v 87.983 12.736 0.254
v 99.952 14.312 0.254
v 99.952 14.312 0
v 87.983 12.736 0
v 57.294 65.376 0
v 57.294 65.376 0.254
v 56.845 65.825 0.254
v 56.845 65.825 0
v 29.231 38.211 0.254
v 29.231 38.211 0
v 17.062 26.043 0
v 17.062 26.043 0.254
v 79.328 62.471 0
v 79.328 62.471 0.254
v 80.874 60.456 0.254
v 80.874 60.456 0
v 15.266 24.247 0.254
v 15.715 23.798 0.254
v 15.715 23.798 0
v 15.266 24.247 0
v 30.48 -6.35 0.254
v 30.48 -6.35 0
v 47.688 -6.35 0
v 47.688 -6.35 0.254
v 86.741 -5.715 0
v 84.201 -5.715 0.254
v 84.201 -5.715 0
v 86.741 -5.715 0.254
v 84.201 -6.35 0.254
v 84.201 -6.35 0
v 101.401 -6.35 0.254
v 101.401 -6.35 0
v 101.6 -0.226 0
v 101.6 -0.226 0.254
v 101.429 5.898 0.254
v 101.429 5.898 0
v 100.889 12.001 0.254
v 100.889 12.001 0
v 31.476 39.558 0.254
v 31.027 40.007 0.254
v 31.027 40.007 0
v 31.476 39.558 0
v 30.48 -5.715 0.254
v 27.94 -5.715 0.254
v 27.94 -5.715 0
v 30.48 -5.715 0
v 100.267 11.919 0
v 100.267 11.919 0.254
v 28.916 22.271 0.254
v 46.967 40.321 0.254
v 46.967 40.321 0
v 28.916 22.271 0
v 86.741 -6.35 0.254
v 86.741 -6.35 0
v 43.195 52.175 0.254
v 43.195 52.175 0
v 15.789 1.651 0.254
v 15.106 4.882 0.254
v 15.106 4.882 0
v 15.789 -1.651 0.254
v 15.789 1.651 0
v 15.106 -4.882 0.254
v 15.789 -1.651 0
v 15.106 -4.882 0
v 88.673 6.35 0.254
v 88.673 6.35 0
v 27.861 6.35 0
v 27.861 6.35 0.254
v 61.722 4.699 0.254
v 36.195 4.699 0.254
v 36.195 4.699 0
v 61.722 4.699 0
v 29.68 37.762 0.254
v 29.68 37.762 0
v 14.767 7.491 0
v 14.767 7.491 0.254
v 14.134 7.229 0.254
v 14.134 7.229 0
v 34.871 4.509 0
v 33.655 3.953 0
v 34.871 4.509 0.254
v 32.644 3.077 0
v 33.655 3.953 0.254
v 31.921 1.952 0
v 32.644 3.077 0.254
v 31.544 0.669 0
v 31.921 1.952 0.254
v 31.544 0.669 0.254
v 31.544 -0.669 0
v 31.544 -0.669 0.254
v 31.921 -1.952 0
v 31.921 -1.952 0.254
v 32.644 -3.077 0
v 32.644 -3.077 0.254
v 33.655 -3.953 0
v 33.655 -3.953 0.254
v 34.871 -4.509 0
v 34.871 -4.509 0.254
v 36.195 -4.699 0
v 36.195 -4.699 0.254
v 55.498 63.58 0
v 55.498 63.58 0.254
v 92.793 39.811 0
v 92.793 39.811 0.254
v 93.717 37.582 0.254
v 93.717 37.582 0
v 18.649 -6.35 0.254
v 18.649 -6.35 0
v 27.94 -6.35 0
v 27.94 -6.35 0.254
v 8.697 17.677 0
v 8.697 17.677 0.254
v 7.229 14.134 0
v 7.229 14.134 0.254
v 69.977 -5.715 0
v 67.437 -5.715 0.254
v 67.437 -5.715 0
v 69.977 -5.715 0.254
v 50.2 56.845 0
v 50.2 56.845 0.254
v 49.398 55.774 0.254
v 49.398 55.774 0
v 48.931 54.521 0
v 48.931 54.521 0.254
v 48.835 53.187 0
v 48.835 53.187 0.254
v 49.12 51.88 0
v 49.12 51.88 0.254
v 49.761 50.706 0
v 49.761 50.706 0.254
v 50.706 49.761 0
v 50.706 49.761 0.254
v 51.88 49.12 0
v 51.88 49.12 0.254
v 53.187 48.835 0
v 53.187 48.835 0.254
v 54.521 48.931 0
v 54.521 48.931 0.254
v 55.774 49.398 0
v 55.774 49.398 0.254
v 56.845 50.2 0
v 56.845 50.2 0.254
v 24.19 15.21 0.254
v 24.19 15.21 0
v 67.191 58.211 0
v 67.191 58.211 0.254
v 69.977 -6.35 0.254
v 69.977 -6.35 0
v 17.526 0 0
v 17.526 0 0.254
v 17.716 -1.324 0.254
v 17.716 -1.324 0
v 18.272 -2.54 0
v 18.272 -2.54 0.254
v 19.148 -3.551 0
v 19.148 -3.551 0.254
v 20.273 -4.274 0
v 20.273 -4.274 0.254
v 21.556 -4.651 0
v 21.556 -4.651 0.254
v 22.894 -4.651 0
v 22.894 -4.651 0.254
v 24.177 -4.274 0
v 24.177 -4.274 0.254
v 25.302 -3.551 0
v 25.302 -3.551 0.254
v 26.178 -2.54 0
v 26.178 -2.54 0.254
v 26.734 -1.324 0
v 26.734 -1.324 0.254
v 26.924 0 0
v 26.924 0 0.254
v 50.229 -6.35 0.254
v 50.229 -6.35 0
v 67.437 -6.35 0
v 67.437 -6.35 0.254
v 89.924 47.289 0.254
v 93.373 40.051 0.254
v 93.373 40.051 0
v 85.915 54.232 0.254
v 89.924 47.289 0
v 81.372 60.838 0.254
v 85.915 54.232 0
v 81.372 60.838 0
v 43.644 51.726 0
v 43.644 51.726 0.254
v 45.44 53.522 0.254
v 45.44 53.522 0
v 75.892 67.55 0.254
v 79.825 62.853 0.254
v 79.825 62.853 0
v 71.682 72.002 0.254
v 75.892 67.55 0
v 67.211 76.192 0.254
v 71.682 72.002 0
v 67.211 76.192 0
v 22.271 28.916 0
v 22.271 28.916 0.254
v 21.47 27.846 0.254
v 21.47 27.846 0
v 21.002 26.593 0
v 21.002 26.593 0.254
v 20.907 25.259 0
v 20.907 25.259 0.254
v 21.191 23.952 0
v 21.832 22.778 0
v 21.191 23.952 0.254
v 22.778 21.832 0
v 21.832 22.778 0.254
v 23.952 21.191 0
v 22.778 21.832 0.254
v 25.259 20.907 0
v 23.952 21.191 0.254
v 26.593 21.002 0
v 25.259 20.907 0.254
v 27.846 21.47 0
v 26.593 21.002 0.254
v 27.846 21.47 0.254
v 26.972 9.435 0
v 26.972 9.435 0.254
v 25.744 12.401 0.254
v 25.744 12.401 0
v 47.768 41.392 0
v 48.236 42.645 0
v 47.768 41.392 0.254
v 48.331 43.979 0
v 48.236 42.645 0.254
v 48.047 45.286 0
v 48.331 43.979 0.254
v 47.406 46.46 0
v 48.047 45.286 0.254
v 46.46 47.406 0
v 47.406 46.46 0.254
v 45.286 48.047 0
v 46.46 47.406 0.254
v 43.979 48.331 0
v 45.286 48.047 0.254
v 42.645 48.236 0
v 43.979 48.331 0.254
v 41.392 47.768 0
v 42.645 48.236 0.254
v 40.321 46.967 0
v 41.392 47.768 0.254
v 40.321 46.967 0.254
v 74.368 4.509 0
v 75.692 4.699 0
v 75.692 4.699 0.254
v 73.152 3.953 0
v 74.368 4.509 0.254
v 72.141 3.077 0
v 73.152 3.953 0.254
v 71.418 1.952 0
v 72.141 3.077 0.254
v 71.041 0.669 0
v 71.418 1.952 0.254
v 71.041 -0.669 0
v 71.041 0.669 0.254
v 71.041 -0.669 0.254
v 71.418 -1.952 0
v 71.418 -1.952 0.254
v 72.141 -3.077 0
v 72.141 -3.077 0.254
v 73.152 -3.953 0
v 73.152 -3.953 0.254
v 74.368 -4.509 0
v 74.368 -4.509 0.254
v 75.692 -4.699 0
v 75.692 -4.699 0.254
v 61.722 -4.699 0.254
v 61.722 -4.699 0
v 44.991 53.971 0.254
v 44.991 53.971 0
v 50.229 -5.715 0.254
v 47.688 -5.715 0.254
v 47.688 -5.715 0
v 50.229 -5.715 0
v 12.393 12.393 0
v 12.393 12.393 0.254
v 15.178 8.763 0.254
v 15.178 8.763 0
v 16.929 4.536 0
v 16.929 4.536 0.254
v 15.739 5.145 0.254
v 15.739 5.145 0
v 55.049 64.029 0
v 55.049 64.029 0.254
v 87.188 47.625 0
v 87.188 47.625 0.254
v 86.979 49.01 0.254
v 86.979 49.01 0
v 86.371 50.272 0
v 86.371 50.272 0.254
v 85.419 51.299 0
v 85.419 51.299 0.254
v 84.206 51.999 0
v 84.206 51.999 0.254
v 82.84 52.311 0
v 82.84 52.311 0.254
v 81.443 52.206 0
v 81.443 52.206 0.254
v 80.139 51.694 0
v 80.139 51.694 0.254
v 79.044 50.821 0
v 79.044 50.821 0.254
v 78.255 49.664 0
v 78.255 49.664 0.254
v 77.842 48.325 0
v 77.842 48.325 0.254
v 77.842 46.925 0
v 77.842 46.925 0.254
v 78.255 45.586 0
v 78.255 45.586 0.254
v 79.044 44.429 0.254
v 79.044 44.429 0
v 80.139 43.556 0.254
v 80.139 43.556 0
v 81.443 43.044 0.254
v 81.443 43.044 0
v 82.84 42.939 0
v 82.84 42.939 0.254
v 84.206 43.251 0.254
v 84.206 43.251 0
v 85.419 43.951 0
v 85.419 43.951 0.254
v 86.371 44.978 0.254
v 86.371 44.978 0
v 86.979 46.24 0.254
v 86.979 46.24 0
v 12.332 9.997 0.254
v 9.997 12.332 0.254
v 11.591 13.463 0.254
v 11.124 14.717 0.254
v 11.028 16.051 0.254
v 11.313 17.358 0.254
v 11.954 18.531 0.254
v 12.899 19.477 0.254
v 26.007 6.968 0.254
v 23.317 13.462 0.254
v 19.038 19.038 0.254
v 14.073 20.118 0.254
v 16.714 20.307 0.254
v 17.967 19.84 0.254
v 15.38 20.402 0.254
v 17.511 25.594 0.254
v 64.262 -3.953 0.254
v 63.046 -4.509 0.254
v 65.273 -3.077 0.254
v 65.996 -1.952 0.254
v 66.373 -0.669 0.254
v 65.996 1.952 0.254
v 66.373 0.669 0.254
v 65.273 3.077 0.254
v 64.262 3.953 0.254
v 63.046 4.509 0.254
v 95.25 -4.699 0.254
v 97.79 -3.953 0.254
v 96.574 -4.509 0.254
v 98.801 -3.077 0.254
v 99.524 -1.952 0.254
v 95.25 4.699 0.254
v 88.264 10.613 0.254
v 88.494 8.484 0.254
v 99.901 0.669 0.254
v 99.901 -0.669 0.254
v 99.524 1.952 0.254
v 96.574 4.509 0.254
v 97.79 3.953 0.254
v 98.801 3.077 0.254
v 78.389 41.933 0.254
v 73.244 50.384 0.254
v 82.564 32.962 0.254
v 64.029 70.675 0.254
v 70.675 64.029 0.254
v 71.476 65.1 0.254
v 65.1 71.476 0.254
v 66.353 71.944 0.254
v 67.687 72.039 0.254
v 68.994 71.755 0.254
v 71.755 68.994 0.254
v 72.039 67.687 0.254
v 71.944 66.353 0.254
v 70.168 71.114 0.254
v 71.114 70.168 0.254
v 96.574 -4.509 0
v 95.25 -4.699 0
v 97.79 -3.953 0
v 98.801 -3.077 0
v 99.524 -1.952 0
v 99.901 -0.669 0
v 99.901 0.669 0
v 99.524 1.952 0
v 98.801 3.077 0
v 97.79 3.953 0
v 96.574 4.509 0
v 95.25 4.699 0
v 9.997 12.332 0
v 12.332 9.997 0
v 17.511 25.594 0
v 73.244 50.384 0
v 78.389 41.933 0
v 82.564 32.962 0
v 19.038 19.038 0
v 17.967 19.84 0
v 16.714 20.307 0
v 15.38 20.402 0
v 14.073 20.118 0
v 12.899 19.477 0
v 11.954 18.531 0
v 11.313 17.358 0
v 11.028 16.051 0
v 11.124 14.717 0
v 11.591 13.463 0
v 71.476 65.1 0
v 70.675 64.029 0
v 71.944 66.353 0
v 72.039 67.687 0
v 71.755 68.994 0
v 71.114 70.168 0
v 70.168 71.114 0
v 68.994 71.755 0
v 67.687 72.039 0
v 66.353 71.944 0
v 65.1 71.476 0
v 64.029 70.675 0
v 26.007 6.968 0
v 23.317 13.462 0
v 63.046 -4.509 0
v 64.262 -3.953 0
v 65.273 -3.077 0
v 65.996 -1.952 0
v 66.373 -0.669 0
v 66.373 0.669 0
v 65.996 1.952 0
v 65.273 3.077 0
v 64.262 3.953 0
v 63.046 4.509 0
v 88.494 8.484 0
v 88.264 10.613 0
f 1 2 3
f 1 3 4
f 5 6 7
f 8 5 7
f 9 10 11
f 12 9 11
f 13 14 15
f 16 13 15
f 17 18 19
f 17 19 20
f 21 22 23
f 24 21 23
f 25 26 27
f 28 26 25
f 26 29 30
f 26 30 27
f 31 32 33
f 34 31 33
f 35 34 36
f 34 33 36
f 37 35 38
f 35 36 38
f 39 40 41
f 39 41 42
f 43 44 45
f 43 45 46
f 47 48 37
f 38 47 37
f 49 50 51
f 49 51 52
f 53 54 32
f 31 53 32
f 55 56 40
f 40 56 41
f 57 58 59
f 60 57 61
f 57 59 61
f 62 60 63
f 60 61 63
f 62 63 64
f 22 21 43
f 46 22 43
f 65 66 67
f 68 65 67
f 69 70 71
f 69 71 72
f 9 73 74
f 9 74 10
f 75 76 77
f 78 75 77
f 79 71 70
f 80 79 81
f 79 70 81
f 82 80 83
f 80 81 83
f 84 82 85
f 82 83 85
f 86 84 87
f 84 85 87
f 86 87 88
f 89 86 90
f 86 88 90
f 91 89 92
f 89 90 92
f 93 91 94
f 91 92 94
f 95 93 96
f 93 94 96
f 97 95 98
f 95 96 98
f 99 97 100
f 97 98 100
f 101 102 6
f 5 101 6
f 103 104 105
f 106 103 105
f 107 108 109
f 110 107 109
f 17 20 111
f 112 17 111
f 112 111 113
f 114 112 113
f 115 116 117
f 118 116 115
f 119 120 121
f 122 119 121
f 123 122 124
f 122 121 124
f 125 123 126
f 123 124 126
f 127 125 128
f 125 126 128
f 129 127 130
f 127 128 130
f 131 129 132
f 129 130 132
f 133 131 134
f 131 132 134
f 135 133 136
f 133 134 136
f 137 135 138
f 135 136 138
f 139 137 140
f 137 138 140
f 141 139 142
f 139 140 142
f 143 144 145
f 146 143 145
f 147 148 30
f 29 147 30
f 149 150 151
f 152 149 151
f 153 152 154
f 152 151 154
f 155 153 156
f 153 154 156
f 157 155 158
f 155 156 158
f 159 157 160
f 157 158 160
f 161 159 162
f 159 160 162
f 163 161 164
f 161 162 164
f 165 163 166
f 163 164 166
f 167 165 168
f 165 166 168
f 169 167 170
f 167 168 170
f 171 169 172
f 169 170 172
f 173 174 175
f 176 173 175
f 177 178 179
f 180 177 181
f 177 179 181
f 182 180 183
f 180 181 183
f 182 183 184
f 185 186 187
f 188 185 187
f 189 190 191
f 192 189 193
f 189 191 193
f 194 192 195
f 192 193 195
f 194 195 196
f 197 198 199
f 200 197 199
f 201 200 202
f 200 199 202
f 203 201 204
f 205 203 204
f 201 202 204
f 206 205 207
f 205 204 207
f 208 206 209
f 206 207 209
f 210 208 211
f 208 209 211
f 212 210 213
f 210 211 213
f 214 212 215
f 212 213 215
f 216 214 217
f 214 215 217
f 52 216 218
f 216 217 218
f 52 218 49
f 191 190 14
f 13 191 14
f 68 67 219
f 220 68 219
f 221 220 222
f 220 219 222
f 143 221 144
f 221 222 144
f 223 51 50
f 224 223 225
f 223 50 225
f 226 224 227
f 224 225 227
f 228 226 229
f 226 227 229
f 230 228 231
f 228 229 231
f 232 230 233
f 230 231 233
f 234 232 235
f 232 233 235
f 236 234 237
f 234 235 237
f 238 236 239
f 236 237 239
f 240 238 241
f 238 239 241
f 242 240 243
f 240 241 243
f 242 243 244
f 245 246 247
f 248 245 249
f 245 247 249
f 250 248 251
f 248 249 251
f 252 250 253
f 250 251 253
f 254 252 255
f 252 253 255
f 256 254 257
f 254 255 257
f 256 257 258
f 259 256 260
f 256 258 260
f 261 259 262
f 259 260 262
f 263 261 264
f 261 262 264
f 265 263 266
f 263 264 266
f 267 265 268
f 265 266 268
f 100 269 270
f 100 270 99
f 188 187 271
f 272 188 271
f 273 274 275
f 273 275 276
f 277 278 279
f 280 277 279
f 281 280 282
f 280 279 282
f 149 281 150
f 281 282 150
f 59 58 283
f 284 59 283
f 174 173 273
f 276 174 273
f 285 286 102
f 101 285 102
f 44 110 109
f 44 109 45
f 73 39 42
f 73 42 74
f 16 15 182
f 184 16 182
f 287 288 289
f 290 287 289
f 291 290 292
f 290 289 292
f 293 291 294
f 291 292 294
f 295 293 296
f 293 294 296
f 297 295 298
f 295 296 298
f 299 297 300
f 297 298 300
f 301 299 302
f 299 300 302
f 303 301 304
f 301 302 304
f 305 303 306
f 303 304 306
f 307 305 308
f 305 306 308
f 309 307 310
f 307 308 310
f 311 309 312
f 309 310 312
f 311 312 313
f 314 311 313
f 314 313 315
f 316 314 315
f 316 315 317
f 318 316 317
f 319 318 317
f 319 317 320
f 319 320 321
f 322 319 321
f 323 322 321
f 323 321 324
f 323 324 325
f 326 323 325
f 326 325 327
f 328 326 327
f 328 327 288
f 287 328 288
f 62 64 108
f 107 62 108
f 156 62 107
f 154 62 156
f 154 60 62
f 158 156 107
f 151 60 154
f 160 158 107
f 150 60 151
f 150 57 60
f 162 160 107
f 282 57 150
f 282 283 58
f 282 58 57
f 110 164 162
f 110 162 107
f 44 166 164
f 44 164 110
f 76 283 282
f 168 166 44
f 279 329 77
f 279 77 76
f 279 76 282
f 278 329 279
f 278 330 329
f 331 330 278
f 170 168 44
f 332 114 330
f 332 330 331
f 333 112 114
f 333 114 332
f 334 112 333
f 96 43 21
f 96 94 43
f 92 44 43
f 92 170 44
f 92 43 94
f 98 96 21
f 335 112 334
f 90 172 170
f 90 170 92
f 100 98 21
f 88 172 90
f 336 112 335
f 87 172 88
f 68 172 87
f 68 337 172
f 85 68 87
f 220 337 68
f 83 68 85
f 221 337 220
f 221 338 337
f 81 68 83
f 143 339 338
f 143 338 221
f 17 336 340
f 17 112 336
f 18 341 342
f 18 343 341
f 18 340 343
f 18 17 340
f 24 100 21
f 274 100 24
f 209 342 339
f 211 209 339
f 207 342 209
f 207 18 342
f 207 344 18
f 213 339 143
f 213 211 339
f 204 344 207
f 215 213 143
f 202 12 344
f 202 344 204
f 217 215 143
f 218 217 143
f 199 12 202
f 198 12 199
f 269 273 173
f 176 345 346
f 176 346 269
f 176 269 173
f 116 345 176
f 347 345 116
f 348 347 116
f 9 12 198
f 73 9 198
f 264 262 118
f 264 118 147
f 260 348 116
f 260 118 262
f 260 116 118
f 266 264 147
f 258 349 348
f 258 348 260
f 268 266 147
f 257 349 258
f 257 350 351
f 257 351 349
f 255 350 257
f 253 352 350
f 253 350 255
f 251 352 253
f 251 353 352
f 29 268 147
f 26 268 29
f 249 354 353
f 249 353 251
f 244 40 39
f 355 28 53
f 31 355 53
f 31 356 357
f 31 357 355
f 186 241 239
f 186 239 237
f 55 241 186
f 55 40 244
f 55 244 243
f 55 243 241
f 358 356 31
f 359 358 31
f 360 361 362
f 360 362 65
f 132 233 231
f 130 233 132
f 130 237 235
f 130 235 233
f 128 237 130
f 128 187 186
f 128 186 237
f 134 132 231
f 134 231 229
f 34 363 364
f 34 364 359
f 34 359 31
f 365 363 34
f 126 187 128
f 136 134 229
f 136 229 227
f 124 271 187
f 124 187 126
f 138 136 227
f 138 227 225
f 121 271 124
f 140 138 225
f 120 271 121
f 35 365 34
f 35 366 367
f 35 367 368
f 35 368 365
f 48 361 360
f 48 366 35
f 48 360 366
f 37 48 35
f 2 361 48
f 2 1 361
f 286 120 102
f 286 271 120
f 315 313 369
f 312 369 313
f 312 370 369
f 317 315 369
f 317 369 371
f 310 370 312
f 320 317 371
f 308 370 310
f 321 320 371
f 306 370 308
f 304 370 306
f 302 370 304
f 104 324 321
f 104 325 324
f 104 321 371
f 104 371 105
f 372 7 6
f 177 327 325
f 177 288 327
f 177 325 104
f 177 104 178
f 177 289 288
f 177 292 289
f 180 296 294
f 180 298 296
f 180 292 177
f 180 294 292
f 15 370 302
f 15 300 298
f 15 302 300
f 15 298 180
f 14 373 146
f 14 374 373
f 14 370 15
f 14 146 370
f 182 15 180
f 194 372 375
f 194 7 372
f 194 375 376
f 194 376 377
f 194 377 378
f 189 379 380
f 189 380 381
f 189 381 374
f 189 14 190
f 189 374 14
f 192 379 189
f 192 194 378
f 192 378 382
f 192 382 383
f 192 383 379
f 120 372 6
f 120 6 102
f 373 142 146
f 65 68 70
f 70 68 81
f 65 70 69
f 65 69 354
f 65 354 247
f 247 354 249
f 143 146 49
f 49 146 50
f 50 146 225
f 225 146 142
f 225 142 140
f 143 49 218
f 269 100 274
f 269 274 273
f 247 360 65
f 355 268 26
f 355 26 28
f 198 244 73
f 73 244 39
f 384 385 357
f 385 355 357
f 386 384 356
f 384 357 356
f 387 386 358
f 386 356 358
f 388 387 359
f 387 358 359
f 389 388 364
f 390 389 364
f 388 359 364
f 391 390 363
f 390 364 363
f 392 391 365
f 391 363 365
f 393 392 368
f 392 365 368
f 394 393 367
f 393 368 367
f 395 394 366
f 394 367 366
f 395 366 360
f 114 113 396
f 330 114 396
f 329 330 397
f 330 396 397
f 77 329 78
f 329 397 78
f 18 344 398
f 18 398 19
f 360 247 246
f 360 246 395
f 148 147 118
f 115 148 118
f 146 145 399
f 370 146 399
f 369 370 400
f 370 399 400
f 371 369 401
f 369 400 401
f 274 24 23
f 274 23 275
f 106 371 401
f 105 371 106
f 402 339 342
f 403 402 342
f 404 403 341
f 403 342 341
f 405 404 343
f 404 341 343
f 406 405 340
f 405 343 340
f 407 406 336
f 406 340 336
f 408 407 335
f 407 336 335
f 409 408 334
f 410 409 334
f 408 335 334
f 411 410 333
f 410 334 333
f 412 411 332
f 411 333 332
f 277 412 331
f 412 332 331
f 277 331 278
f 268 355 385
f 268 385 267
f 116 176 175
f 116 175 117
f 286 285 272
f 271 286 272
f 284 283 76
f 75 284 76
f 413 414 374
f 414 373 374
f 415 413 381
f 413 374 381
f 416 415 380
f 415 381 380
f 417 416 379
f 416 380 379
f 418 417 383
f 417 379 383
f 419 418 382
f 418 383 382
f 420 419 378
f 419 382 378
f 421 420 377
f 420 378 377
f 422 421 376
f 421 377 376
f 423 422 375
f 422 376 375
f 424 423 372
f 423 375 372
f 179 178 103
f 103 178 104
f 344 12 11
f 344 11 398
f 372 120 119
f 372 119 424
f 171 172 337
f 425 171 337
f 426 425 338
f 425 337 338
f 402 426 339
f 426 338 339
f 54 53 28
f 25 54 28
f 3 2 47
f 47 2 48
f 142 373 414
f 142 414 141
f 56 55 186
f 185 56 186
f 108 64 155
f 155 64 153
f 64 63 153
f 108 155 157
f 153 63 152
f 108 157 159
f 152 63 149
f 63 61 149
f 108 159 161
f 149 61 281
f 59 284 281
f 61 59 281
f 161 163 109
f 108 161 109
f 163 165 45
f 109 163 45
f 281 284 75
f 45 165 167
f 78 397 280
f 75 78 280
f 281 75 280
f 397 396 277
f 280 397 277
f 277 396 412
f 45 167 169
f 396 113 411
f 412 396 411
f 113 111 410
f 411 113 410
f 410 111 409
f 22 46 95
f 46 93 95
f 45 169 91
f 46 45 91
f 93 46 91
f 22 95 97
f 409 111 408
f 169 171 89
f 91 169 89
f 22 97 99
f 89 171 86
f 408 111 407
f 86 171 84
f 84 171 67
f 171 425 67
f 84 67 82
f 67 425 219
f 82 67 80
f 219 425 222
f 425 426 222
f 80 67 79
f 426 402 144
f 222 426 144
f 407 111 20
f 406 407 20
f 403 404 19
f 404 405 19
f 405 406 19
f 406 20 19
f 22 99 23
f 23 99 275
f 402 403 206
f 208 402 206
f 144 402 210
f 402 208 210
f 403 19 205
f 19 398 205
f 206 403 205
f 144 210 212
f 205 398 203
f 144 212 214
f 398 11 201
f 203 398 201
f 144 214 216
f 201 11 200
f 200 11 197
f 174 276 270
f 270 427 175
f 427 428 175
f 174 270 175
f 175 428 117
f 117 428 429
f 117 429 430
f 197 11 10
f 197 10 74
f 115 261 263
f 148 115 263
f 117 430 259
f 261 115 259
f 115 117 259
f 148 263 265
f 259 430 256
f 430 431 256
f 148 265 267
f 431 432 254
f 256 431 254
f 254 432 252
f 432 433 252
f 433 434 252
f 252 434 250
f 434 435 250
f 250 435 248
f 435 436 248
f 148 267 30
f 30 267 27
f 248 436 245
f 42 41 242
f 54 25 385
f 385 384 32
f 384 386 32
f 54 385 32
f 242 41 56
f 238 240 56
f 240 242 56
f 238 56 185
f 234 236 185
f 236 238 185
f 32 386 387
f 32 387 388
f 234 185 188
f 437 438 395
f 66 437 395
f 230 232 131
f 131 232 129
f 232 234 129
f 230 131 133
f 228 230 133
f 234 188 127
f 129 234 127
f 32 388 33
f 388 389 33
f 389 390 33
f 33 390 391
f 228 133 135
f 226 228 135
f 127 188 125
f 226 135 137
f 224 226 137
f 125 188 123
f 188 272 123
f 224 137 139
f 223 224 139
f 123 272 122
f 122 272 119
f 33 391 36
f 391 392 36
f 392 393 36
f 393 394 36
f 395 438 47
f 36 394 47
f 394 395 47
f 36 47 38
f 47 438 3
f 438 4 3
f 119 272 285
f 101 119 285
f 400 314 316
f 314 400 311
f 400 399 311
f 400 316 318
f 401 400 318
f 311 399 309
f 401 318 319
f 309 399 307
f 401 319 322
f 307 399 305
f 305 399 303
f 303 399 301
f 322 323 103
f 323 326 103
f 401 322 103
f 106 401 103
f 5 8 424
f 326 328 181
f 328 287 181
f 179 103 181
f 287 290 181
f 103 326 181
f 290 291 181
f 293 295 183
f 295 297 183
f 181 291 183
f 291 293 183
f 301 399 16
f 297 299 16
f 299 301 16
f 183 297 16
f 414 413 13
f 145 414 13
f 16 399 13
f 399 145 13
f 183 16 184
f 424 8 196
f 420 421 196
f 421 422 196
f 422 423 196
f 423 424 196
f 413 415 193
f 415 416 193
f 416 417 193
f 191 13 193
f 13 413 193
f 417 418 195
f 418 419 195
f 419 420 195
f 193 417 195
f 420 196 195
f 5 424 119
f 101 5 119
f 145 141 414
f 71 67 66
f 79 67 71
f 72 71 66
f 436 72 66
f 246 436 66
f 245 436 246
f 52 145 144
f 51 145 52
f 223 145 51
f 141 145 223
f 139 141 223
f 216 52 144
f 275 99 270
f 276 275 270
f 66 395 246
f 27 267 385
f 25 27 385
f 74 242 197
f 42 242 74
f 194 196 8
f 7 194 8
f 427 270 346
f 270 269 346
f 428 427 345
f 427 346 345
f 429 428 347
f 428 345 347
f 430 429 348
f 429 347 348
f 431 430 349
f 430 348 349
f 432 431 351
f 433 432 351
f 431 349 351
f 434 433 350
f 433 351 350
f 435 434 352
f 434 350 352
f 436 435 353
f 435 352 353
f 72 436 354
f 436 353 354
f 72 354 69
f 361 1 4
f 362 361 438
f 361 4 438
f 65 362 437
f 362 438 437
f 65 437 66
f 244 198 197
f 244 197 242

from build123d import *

# Parameters (mm, degrees)
BOSS_EXTRUDE1_DEPTH = 0.254
SKETCH2_R           = 4.699
CUT_EXTRUDE1_DEPTH  = 1.254
SKETCH3_W           = 2.54
SKETCH3_H           = 0.635
CUT_EXTRUDE2_DEPTH  = 1.254
CUT_EXTRUDE4_DEPTH  = 1.254
CUT_EXTRUDE5_DEPTH  = 1.254


with BuildPart() as part:
    # Sketch1 → Boss-Extrude1 (new body)
    with BuildSketch(Plane.XY):
        with BuildLine():
            Line((67.21146711, 76.191723231), (8.696654013, 17.676910134))
            Line((8.696654013, 17.676910134), (7.228954972, 14.133571205))
            ThreePointArc((7.228954972, 14.133571205), (14.666587579, 6.075099489), (15.105587123, -4.88230096))
            Line((15.105587123, -4.88230096), (18.648926052, -6.35))
            Line((18.648926052, -6.35), (101.401368334, -6.35))
            ThreePointArc((101.401368334, -6.35), (93.866160503, 38.880636728), (67.21146711, 76.191723231))
        make_face()
        with BuildLine():
            Line((88.672924278, 6.35), (27.86051193, 6.35))
            ThreePointArc((27.86051193, 6.35), (26.399857642, 10.93517908), (24.190484974, 15.210228852))
            Line((24.190484974, 15.210228852), (67.191354125, 58.211098004))
            ThreePointArc((67.191354125, 58.211098004), (82.13289044, 34.020557137), (88.672924278, 6.35))
        make_face(mode=Mode.SUBTRACT)
    extrude(amount=BOSS_EXTRUDE1_DEPTH)

    # Sketch2 → Cut-Extrude1 (cut, through all)
    with BuildSketch(Plane.XY.offset(0.254)):
        with Locations((22.225, 0)):
            Circle(SKETCH2_R)
        with Locations((36.195, 0)):
            Circle(SKETCH2_R)
        with Locations((61.722, 0)):
            Circle(SKETCH2_R)
        with Locations((75.692, 0)):
            Circle(SKETCH2_R)
        with Locations((95.25, 0)):
            Circle(SKETCH2_R)
        with Locations((15.715448212, 15.715448212)):
            Circle(SKETCH2_R)
        with Locations((25.593729945, 25.593729945)):
            Circle(SKETCH2_R)
        with Locations((43.644044748, 43.644044748)):
            Circle(SKETCH2_R)
        with Locations((53.522326482, 53.522326482)):
            Circle(SKETCH2_R)
        with Locations((92.004434954, 24.652514046)):
            Circle(SKETCH2_R)
        with Locations((82.48891971, 47.625)):
            Circle(SKETCH2_R)
        with Locations((67.351920908, 67.351920908)):
            Circle(SKETCH2_R)
    extrude(amount=-CUT_EXTRUDE1_DEPTH, mode=Mode.SUBTRACT)

    # Sketch3 → Cut-Extrude2 (cut, through all)
    with BuildSketch(Plane.XY.offset(0.254)):
        Polygon((15.266435406, 24.246691527), (17.06248663, 26.042742751), (17.511499436, 25.593729945), (15.715448212, 23.797678721), align=None)
        Polygon((44.991083167, 53.971339288), (43.195031942, 52.175288063), (43.644044748, 51.726275257), (45.440095973, 53.522326482), align=None)
        with Locations((29.21, -6.0325)):
            Rectangle(SKETCH3_W, SKETCH3_H)
        with Locations((68.707, -6.0325)):
            Rectangle(SKETCH3_W, SKETCH3_H)
        Polygon((29.230733674, 38.210989795), (31.026784898, 40.007041019), (31.475797704, 39.558028213), (29.67974648, 37.761976989), align=None)
        Polygon((56.845021246, 65.825277367), (55.048970022, 64.029226143), (55.497982828, 63.580213337), (57.294034052, 65.376264561), align=None)
        with Locations((48.9585, -6.0325)):
            Rectangle(SKETCH3_W, SKETCH3_H)
        with Locations((85.471, -6.0325)):
            Rectangle(SKETCH3_W, SKETCH3_H)
        Polygon((99.935462164, 14.437711971), (100.266998693, 11.919442024), (101.526133667, 12.085210288), (101.194597138, 14.603480236), align=None)
        Polygon((93.765504959, 37.464305742), (94.938831965, 37.950313702), (93.966816047, 40.296967714), (92.793489041, 39.810959755), align=None)
        Polygon((79.327792988, 62.471156422), (80.874047017, 60.456038938), (81.88160576, 61.229165953), (80.33535173, 63.244283437), align=None)
        Polygon((13.593916116, 7.005422516), (14.565932035, 4.658768503), (15.739259041, 5.144776462), (14.767243123, 7.491430475), align=None)
    extrude(amount=-CUT_EXTRUDE2_DEPTH, mode=Mode.SUBTRACT)

    # Sketch6 → Cut-Extrude4 (cut, through all)
    with BuildSketch(Plane.XY.offset(0.254)):
        with BuildLine():
            Line((22.27103518, 28.91642471), (40.321349984, 46.966739513))
            ThreePointArc((40.321349984, 46.966739513), (46.966739513, 46.966739513), (46.966739513, 40.321349984))
            Line((46.966739513, 40.321349984), (28.91642471, 22.27103518))
            ThreePointArc((28.91642471, 22.27103518), (22.27103518, 22.27103518), (22.27103518, 28.91642471))
        make_face()
        with BuildLine():
            Line((50.199631717, 56.845021246), (64.029226143, 70.674615673))
            ThreePointArc((64.029226143, 70.674615673), (70.674615673, 70.674615673), (70.674615673, 64.029226143))
            Line((70.674615673, 64.029226143), (56.845021246, 50.199631717))
            ThreePointArc((56.845021246, 50.199631717), (50.199631717, 50.199631717), (50.199631717, 56.845021246))
        make_face()
        with BuildLine():
            Line((61.722, -4.699), (36.195, -4.699))
            ThreePointArc((36.195, -4.699), (31.496, 0), (36.195, 4.699))
            Line((36.195, 4.699), (61.722, 4.699))
            ThreePointArc((61.722, 4.699), (66.421, 0), (61.722, -4.699))
        make_face()
        with BuildLine():
            Line((95.25, -4.699), (75.692, -4.699))
            ThreePointArc((75.692, -4.699), (70.993, 0), (75.692, 4.699))
            Line((75.692, 4.699), (95.25, 4.699))
            ThreePointArc((95.25, 4.699), (99.949, 0), (95.25, -4.699))
        make_face()
        with BuildLine():
            ThreePointArc((26.924, 0), (24.874532533, 10.303368733), (19.038142977, 19.038142977))
            ThreePointArc((19.038142977, 19.038142977), (12.392753447, 19.038142977), (12.392753447, 12.392753447))
            ThreePointArc((12.392753447, 12.392753447), (16.191912687, 6.706909836), (17.526, 0))
            ThreePointArc((17.526, 0), (22.225, -4.699), (26.924, 0))
        make_face()
    extrude(amount=-CUT_EXTRUDE4_DEPTH, mode=Mode.SUBTRACT)

    # Sketch5 → Cut-Extrude5 (cut, through all)
    with BuildSketch(Plane.XY.offset(0.254)):
        with BuildLine():
            Line((81.390083385, 32.475702096), (95.471027857, 38.308220267))
            ThreePointArc((95.471027857, 38.308220267), (99.36478975, 26.62471517), (101.834445583, 14.559622003))
            Line((101.834445583, 14.559622003), (86.723730875, 12.570258672))
            ThreePointArc((86.723730875, 12.570258672), (84.644080158, 22.680312922), (81.390083385, 32.475702096))
        make_face()
    extrude(amount=-CUT_EXTRUDE5_DEPTH, mode=Mode.SUBTRACT)


solid = part.part
